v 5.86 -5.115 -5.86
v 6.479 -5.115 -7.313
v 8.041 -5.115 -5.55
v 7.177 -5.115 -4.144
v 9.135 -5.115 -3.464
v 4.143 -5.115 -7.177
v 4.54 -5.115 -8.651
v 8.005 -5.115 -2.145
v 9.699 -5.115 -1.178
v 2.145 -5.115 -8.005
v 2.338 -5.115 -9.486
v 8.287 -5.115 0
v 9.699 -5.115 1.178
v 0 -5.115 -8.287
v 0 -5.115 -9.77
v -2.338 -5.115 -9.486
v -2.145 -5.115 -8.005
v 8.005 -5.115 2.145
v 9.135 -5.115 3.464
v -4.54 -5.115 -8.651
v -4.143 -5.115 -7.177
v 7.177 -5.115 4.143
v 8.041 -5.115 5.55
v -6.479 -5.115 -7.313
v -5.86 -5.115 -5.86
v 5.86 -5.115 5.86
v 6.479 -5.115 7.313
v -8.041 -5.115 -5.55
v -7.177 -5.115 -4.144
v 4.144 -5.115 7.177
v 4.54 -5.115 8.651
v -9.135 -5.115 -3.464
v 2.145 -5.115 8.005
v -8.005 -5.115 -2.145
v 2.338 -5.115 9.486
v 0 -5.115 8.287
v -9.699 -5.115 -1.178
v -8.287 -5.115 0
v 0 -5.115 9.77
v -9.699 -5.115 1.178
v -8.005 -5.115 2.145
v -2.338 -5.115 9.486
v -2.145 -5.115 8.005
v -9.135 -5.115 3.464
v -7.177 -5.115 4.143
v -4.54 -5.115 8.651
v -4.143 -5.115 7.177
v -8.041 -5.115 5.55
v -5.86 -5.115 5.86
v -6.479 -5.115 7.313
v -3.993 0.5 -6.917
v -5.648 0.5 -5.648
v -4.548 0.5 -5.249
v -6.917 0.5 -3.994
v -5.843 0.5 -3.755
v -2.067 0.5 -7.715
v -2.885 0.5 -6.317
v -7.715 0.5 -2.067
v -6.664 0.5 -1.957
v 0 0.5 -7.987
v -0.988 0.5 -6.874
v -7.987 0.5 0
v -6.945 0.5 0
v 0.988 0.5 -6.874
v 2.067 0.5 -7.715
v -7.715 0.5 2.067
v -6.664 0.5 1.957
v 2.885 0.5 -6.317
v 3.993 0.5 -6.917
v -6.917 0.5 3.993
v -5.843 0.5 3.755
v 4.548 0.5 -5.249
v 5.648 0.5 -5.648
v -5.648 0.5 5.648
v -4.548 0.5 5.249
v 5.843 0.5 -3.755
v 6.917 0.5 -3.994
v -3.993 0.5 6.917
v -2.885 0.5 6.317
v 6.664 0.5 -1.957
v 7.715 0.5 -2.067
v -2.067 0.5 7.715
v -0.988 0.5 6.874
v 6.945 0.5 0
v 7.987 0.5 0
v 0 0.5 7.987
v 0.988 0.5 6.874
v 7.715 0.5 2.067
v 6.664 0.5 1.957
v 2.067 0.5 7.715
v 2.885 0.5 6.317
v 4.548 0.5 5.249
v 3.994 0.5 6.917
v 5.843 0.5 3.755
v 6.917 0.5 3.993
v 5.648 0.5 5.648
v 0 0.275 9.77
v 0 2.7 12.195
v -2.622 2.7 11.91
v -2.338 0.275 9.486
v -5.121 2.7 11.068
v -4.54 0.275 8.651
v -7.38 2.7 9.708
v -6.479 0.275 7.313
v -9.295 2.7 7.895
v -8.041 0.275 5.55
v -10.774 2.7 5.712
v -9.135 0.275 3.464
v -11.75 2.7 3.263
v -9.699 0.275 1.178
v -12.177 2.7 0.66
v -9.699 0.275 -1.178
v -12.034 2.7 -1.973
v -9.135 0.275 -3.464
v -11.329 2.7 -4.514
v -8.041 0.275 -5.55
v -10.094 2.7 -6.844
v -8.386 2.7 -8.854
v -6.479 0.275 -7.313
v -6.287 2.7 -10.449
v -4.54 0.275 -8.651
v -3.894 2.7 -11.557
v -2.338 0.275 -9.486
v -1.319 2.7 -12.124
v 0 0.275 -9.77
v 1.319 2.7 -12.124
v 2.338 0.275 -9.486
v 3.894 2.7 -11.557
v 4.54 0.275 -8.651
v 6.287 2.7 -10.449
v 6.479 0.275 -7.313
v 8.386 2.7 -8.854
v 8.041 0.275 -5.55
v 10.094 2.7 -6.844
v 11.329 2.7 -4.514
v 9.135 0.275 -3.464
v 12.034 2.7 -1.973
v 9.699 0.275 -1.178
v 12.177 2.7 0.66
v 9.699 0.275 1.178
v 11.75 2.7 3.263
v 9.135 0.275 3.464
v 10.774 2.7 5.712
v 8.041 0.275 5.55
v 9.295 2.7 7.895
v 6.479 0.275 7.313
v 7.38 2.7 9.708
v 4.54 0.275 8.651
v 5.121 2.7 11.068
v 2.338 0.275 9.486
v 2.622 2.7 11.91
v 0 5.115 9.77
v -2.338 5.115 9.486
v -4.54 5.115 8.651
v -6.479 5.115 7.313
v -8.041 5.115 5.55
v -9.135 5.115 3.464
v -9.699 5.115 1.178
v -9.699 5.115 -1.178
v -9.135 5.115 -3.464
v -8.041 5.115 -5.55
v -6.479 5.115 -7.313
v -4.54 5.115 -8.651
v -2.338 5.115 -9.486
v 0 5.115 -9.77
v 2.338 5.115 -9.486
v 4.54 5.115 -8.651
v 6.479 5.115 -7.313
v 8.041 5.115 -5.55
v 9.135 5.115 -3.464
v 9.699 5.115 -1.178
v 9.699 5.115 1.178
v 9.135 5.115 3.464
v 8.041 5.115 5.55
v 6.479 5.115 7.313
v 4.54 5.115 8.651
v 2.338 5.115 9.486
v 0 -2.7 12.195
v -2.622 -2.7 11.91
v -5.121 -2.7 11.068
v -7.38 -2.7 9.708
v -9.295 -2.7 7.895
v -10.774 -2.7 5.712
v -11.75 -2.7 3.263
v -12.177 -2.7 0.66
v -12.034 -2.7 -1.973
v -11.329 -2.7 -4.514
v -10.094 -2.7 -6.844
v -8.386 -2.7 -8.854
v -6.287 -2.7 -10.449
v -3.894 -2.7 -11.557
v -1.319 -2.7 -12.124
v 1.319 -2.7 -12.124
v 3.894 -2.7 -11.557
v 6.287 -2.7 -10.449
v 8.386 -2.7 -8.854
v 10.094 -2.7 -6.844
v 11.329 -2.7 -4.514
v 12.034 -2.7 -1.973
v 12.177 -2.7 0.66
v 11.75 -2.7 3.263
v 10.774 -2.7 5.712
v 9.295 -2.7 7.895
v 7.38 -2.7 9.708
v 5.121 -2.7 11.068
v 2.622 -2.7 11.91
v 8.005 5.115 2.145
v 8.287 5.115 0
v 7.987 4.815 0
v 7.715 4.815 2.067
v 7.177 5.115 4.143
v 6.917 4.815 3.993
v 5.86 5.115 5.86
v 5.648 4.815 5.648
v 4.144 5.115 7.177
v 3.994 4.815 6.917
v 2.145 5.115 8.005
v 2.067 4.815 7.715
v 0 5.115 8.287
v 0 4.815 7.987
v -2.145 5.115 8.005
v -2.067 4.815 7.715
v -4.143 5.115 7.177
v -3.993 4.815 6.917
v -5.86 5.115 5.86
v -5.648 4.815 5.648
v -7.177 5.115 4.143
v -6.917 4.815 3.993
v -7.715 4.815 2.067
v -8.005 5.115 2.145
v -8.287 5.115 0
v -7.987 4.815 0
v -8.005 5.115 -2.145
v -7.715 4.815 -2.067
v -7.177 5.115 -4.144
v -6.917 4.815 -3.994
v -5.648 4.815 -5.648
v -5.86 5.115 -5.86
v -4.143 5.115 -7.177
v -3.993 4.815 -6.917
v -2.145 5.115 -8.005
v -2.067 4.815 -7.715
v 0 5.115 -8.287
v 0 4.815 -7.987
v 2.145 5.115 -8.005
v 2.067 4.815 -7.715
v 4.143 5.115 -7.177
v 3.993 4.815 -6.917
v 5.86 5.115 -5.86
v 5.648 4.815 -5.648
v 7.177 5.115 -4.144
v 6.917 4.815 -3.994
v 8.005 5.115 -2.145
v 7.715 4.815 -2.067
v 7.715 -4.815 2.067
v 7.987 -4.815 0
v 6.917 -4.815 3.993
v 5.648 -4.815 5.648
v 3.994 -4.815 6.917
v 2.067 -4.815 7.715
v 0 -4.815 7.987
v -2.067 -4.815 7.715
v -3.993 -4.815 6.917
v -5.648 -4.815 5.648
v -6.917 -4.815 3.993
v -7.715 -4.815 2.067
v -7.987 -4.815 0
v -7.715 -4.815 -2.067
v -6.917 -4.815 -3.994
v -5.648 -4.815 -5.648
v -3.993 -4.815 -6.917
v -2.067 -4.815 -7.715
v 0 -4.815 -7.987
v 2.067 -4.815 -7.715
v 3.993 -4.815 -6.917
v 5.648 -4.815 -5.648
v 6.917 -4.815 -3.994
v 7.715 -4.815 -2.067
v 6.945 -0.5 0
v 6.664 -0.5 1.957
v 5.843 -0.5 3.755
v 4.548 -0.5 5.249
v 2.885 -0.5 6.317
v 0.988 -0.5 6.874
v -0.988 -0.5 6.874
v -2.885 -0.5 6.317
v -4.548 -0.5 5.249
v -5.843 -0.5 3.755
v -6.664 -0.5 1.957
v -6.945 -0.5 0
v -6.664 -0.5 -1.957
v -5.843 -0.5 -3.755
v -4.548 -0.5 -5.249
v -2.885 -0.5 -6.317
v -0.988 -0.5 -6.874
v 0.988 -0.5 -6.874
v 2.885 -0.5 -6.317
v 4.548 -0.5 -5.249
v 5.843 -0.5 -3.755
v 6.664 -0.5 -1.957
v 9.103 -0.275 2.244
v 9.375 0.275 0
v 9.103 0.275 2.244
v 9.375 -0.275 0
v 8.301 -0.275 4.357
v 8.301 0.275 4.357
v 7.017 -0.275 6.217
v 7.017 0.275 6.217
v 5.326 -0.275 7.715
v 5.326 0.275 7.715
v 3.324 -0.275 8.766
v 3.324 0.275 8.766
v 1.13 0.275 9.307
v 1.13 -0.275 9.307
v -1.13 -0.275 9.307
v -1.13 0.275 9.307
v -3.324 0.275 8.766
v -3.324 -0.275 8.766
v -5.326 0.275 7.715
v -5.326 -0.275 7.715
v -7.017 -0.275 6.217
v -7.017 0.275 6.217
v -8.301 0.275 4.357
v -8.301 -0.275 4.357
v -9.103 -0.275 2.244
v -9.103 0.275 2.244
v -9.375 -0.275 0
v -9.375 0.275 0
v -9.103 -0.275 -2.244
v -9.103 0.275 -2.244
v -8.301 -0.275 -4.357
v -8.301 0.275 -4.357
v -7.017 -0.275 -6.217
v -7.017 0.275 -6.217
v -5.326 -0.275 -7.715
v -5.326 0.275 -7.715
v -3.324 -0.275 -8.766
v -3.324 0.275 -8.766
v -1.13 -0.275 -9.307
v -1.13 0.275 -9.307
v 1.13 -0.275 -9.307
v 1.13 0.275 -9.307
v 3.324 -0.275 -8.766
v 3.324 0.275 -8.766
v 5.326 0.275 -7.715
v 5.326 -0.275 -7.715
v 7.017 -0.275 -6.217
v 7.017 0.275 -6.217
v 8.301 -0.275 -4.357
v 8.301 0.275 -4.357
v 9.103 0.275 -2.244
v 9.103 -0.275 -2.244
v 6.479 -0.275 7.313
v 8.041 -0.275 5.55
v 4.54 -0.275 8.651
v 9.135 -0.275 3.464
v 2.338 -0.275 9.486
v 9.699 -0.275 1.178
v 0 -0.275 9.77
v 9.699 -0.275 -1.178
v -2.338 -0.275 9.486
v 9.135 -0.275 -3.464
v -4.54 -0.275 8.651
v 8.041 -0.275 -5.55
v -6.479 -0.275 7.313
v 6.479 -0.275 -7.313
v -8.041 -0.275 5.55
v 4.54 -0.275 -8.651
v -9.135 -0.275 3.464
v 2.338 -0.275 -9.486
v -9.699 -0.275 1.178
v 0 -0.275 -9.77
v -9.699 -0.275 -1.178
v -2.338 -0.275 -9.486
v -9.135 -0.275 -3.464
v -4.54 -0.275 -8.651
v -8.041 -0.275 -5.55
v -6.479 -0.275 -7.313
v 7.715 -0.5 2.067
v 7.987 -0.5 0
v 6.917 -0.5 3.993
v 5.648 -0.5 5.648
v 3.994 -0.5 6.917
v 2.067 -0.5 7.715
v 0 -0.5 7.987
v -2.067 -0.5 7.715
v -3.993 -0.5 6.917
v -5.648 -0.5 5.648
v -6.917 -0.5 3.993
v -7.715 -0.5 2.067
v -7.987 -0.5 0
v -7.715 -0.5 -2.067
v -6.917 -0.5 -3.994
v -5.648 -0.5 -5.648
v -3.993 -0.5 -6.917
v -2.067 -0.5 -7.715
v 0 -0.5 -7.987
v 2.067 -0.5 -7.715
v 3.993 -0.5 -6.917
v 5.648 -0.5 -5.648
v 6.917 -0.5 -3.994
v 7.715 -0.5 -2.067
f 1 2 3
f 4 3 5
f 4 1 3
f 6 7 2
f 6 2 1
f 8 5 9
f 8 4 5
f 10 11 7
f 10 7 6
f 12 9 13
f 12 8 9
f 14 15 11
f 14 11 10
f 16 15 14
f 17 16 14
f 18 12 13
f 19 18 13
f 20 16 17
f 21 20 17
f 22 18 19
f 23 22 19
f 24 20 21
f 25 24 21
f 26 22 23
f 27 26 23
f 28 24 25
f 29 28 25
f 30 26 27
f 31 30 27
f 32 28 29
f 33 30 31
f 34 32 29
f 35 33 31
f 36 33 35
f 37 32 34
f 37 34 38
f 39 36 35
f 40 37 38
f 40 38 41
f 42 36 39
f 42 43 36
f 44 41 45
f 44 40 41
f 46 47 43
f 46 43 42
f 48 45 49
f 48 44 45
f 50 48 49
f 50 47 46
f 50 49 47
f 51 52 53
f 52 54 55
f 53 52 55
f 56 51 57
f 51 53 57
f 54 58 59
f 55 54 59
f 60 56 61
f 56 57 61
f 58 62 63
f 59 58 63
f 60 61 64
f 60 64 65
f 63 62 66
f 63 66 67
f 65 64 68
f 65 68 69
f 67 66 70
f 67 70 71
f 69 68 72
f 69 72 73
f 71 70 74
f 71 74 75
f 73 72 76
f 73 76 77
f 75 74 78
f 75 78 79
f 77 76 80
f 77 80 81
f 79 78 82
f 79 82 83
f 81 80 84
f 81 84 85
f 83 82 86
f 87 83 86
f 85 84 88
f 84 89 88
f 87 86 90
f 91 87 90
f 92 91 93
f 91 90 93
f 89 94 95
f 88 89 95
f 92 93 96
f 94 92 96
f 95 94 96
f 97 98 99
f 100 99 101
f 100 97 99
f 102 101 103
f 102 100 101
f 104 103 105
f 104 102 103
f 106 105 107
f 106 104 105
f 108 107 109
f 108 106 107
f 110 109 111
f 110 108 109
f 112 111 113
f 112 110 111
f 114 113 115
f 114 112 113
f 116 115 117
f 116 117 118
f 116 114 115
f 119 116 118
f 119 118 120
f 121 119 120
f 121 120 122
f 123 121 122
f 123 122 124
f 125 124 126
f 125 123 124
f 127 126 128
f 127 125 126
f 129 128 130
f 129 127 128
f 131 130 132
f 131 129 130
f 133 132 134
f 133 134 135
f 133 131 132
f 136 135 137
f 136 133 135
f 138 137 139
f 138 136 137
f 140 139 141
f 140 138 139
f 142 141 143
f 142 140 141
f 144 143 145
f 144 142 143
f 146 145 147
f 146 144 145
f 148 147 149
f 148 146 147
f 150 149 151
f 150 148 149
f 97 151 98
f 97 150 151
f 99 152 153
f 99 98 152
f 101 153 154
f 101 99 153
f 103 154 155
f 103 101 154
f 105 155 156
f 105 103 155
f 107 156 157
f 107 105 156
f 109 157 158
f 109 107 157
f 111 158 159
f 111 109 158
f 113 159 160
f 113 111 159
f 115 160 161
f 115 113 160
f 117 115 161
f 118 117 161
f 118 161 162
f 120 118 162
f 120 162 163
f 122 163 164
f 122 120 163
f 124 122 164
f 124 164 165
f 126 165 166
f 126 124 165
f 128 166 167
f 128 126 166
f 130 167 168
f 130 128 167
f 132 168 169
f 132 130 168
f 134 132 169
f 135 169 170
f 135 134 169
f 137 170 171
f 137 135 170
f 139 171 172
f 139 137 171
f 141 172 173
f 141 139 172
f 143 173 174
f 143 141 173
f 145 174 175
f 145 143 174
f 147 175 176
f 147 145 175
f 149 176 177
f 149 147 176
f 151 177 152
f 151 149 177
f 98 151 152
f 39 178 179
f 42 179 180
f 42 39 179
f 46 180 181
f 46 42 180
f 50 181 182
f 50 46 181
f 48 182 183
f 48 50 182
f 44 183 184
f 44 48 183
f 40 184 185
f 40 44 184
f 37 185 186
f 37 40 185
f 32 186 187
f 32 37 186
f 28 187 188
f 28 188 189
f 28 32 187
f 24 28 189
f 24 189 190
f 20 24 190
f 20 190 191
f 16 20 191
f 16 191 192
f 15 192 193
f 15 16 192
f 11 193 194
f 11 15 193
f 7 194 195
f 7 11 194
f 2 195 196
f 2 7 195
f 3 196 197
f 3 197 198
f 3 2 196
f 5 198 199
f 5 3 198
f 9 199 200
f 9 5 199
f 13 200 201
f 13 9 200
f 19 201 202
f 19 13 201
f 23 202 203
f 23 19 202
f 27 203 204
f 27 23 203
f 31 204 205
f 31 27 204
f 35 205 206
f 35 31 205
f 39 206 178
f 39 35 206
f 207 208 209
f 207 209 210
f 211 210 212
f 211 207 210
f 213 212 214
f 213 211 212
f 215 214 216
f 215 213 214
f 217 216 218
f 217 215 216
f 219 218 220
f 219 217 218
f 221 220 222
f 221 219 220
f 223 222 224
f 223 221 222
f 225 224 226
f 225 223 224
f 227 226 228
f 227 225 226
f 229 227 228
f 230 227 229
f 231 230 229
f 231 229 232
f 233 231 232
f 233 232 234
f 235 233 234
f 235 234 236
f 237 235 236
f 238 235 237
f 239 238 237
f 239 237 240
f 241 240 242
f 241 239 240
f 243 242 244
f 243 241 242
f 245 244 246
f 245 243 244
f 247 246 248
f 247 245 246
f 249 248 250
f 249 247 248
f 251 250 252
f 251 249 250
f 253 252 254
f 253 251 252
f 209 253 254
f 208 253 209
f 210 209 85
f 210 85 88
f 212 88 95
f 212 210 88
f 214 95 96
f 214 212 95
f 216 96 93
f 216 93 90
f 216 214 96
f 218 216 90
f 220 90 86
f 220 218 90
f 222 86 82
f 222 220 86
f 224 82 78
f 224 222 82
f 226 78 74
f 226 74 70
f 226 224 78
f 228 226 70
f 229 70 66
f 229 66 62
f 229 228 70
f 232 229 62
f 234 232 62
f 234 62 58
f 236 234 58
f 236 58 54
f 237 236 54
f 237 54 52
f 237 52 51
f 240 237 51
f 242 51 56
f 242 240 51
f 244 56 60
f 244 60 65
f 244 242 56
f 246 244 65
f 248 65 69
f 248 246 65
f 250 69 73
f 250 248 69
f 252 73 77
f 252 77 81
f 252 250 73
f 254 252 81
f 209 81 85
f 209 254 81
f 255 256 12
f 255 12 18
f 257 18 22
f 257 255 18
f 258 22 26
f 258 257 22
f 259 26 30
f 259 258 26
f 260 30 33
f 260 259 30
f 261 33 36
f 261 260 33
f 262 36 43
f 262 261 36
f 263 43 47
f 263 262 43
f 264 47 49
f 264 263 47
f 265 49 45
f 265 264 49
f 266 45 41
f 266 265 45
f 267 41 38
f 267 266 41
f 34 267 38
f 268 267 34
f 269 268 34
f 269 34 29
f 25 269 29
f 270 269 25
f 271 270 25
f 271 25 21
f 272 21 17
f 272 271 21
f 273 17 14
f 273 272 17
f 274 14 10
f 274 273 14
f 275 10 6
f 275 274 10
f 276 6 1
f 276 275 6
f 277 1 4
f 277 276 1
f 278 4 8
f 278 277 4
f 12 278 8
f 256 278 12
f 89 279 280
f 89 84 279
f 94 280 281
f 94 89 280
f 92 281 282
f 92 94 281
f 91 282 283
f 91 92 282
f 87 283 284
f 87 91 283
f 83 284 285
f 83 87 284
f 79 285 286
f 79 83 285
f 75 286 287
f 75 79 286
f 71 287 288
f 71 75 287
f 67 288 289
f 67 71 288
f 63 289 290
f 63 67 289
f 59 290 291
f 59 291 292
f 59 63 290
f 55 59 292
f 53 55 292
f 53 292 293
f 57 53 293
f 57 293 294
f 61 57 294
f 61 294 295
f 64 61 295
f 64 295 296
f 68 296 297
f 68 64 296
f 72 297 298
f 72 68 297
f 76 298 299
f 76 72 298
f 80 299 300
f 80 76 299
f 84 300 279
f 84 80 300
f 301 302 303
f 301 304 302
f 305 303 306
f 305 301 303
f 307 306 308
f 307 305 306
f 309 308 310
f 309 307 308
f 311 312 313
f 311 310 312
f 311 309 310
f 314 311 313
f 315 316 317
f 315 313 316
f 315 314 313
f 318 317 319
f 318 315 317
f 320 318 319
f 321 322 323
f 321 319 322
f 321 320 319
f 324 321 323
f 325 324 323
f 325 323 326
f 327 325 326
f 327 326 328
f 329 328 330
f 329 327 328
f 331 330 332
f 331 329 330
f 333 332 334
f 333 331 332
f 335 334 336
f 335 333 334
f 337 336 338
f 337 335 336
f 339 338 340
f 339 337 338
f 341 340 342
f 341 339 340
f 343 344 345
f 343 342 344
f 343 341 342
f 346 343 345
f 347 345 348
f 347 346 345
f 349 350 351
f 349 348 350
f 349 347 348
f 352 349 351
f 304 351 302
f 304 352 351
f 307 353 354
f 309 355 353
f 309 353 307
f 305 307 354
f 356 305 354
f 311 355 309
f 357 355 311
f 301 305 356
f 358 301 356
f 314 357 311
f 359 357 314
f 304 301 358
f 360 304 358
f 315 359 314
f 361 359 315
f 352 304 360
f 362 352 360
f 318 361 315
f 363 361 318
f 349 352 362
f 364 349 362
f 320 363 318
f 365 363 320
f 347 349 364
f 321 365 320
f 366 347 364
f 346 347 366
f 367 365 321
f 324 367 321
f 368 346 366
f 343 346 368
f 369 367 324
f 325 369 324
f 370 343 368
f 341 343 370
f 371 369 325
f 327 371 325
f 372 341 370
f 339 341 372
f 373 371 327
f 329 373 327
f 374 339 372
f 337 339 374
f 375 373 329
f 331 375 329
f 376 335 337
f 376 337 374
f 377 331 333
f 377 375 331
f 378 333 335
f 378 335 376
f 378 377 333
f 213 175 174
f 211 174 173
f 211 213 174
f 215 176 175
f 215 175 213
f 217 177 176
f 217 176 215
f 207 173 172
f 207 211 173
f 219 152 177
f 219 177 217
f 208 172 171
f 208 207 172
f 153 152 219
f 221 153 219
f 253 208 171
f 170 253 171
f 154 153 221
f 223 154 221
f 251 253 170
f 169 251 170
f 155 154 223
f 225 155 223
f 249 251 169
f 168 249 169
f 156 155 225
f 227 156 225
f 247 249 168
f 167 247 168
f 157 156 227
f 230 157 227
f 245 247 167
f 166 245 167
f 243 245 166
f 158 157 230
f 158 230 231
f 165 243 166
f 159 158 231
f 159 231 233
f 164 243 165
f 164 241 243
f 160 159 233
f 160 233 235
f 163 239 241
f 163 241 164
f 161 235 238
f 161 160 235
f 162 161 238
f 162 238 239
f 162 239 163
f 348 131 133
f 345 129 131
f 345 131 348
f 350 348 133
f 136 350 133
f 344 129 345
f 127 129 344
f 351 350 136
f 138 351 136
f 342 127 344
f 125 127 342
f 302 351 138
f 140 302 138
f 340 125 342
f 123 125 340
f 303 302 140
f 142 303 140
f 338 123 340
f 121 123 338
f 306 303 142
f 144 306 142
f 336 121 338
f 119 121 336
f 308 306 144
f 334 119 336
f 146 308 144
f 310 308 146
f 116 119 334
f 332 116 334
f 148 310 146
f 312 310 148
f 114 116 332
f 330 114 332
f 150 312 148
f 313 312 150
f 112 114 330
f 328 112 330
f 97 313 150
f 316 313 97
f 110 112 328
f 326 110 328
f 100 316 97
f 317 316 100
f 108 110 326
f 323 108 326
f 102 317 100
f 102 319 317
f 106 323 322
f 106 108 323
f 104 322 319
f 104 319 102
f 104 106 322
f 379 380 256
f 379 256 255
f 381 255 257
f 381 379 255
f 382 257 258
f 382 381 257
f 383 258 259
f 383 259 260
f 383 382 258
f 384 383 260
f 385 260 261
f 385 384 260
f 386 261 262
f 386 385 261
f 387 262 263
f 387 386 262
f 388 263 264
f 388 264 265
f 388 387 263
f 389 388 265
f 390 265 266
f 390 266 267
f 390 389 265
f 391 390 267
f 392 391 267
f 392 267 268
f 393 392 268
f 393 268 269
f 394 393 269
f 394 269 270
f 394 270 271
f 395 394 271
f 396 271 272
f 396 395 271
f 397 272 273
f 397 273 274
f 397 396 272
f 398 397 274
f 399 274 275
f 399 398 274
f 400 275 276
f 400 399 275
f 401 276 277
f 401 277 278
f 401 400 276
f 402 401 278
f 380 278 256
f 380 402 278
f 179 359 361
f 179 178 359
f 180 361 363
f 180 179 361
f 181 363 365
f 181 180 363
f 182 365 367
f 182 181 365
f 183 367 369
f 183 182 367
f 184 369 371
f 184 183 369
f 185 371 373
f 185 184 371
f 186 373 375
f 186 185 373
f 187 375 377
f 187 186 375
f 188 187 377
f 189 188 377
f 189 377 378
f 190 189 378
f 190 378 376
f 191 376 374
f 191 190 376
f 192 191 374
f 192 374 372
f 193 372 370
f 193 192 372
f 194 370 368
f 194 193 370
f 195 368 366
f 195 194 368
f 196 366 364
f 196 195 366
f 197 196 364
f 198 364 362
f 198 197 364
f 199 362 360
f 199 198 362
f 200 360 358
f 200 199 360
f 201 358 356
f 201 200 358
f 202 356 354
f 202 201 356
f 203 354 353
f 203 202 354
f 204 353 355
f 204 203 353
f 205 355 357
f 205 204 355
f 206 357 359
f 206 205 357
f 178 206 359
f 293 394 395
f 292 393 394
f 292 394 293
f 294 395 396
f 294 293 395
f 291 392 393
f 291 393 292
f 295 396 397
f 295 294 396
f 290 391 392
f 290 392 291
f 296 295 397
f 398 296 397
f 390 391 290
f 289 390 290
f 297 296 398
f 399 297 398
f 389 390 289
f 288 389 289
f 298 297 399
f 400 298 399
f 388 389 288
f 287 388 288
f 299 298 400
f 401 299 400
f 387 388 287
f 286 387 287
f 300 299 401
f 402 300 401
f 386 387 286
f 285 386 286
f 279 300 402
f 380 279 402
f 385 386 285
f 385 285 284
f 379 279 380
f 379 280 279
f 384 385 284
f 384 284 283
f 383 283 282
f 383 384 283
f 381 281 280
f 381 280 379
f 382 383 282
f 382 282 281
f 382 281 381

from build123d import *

# Parameters (mm, degrees)
F0_R     = 9.375
F0_R_2   = 7.987
F1_DEPTH = 5.115
F0_R_3   = 6.945
F2_DEPTH = 0.5
F5_SIZE  = 0.3


with BuildPart() as f1:
    # F0 (on Front) → F1 (new body, symmetric)
    with BuildSketch(Plane.XZ):
        Circle(F0_R)
        Circle(F0_R_2, mode=Mode.SUBTRACT)
    extrude(amount=F1_DEPTH, both=True)

    # F0 (on Front) → F2 (join, symmetric)
    with BuildSketch(Plane.XZ):
        Circle(F0_R_2)
        Circle(F0_R_3, mode=Mode.SUBTRACT)
    extrude(amount=F2_DEPTH, both=True)

    # F3 (on Right) → F4 (revolve)
    with BuildSketch(Plane.YZ):
        Polygon((0.275, 9.77), (0.275, 9.375), (5.115, 9.375), (5.115, 9.77), (2.7, 12.195), align=None)
        Polygon((-5.115, 9.375), (-0.275, 9.375), (-0.275, 9.77), (-2.7, 12.195), (-5.115, 9.77), align=None)
    revolve(axis=Axis((0, -0.5, 0), (0, -1, 0)))

    # F5
    f5_edges = [f1.edges().sort_by_distance(p)[0] for p in [
        (-7.987, 5.115, 0),
        (-7.987, -5.115, 0),
    ]]
    chamfer(f5_edges, length=F5_SIZE)


solid = f1.part
